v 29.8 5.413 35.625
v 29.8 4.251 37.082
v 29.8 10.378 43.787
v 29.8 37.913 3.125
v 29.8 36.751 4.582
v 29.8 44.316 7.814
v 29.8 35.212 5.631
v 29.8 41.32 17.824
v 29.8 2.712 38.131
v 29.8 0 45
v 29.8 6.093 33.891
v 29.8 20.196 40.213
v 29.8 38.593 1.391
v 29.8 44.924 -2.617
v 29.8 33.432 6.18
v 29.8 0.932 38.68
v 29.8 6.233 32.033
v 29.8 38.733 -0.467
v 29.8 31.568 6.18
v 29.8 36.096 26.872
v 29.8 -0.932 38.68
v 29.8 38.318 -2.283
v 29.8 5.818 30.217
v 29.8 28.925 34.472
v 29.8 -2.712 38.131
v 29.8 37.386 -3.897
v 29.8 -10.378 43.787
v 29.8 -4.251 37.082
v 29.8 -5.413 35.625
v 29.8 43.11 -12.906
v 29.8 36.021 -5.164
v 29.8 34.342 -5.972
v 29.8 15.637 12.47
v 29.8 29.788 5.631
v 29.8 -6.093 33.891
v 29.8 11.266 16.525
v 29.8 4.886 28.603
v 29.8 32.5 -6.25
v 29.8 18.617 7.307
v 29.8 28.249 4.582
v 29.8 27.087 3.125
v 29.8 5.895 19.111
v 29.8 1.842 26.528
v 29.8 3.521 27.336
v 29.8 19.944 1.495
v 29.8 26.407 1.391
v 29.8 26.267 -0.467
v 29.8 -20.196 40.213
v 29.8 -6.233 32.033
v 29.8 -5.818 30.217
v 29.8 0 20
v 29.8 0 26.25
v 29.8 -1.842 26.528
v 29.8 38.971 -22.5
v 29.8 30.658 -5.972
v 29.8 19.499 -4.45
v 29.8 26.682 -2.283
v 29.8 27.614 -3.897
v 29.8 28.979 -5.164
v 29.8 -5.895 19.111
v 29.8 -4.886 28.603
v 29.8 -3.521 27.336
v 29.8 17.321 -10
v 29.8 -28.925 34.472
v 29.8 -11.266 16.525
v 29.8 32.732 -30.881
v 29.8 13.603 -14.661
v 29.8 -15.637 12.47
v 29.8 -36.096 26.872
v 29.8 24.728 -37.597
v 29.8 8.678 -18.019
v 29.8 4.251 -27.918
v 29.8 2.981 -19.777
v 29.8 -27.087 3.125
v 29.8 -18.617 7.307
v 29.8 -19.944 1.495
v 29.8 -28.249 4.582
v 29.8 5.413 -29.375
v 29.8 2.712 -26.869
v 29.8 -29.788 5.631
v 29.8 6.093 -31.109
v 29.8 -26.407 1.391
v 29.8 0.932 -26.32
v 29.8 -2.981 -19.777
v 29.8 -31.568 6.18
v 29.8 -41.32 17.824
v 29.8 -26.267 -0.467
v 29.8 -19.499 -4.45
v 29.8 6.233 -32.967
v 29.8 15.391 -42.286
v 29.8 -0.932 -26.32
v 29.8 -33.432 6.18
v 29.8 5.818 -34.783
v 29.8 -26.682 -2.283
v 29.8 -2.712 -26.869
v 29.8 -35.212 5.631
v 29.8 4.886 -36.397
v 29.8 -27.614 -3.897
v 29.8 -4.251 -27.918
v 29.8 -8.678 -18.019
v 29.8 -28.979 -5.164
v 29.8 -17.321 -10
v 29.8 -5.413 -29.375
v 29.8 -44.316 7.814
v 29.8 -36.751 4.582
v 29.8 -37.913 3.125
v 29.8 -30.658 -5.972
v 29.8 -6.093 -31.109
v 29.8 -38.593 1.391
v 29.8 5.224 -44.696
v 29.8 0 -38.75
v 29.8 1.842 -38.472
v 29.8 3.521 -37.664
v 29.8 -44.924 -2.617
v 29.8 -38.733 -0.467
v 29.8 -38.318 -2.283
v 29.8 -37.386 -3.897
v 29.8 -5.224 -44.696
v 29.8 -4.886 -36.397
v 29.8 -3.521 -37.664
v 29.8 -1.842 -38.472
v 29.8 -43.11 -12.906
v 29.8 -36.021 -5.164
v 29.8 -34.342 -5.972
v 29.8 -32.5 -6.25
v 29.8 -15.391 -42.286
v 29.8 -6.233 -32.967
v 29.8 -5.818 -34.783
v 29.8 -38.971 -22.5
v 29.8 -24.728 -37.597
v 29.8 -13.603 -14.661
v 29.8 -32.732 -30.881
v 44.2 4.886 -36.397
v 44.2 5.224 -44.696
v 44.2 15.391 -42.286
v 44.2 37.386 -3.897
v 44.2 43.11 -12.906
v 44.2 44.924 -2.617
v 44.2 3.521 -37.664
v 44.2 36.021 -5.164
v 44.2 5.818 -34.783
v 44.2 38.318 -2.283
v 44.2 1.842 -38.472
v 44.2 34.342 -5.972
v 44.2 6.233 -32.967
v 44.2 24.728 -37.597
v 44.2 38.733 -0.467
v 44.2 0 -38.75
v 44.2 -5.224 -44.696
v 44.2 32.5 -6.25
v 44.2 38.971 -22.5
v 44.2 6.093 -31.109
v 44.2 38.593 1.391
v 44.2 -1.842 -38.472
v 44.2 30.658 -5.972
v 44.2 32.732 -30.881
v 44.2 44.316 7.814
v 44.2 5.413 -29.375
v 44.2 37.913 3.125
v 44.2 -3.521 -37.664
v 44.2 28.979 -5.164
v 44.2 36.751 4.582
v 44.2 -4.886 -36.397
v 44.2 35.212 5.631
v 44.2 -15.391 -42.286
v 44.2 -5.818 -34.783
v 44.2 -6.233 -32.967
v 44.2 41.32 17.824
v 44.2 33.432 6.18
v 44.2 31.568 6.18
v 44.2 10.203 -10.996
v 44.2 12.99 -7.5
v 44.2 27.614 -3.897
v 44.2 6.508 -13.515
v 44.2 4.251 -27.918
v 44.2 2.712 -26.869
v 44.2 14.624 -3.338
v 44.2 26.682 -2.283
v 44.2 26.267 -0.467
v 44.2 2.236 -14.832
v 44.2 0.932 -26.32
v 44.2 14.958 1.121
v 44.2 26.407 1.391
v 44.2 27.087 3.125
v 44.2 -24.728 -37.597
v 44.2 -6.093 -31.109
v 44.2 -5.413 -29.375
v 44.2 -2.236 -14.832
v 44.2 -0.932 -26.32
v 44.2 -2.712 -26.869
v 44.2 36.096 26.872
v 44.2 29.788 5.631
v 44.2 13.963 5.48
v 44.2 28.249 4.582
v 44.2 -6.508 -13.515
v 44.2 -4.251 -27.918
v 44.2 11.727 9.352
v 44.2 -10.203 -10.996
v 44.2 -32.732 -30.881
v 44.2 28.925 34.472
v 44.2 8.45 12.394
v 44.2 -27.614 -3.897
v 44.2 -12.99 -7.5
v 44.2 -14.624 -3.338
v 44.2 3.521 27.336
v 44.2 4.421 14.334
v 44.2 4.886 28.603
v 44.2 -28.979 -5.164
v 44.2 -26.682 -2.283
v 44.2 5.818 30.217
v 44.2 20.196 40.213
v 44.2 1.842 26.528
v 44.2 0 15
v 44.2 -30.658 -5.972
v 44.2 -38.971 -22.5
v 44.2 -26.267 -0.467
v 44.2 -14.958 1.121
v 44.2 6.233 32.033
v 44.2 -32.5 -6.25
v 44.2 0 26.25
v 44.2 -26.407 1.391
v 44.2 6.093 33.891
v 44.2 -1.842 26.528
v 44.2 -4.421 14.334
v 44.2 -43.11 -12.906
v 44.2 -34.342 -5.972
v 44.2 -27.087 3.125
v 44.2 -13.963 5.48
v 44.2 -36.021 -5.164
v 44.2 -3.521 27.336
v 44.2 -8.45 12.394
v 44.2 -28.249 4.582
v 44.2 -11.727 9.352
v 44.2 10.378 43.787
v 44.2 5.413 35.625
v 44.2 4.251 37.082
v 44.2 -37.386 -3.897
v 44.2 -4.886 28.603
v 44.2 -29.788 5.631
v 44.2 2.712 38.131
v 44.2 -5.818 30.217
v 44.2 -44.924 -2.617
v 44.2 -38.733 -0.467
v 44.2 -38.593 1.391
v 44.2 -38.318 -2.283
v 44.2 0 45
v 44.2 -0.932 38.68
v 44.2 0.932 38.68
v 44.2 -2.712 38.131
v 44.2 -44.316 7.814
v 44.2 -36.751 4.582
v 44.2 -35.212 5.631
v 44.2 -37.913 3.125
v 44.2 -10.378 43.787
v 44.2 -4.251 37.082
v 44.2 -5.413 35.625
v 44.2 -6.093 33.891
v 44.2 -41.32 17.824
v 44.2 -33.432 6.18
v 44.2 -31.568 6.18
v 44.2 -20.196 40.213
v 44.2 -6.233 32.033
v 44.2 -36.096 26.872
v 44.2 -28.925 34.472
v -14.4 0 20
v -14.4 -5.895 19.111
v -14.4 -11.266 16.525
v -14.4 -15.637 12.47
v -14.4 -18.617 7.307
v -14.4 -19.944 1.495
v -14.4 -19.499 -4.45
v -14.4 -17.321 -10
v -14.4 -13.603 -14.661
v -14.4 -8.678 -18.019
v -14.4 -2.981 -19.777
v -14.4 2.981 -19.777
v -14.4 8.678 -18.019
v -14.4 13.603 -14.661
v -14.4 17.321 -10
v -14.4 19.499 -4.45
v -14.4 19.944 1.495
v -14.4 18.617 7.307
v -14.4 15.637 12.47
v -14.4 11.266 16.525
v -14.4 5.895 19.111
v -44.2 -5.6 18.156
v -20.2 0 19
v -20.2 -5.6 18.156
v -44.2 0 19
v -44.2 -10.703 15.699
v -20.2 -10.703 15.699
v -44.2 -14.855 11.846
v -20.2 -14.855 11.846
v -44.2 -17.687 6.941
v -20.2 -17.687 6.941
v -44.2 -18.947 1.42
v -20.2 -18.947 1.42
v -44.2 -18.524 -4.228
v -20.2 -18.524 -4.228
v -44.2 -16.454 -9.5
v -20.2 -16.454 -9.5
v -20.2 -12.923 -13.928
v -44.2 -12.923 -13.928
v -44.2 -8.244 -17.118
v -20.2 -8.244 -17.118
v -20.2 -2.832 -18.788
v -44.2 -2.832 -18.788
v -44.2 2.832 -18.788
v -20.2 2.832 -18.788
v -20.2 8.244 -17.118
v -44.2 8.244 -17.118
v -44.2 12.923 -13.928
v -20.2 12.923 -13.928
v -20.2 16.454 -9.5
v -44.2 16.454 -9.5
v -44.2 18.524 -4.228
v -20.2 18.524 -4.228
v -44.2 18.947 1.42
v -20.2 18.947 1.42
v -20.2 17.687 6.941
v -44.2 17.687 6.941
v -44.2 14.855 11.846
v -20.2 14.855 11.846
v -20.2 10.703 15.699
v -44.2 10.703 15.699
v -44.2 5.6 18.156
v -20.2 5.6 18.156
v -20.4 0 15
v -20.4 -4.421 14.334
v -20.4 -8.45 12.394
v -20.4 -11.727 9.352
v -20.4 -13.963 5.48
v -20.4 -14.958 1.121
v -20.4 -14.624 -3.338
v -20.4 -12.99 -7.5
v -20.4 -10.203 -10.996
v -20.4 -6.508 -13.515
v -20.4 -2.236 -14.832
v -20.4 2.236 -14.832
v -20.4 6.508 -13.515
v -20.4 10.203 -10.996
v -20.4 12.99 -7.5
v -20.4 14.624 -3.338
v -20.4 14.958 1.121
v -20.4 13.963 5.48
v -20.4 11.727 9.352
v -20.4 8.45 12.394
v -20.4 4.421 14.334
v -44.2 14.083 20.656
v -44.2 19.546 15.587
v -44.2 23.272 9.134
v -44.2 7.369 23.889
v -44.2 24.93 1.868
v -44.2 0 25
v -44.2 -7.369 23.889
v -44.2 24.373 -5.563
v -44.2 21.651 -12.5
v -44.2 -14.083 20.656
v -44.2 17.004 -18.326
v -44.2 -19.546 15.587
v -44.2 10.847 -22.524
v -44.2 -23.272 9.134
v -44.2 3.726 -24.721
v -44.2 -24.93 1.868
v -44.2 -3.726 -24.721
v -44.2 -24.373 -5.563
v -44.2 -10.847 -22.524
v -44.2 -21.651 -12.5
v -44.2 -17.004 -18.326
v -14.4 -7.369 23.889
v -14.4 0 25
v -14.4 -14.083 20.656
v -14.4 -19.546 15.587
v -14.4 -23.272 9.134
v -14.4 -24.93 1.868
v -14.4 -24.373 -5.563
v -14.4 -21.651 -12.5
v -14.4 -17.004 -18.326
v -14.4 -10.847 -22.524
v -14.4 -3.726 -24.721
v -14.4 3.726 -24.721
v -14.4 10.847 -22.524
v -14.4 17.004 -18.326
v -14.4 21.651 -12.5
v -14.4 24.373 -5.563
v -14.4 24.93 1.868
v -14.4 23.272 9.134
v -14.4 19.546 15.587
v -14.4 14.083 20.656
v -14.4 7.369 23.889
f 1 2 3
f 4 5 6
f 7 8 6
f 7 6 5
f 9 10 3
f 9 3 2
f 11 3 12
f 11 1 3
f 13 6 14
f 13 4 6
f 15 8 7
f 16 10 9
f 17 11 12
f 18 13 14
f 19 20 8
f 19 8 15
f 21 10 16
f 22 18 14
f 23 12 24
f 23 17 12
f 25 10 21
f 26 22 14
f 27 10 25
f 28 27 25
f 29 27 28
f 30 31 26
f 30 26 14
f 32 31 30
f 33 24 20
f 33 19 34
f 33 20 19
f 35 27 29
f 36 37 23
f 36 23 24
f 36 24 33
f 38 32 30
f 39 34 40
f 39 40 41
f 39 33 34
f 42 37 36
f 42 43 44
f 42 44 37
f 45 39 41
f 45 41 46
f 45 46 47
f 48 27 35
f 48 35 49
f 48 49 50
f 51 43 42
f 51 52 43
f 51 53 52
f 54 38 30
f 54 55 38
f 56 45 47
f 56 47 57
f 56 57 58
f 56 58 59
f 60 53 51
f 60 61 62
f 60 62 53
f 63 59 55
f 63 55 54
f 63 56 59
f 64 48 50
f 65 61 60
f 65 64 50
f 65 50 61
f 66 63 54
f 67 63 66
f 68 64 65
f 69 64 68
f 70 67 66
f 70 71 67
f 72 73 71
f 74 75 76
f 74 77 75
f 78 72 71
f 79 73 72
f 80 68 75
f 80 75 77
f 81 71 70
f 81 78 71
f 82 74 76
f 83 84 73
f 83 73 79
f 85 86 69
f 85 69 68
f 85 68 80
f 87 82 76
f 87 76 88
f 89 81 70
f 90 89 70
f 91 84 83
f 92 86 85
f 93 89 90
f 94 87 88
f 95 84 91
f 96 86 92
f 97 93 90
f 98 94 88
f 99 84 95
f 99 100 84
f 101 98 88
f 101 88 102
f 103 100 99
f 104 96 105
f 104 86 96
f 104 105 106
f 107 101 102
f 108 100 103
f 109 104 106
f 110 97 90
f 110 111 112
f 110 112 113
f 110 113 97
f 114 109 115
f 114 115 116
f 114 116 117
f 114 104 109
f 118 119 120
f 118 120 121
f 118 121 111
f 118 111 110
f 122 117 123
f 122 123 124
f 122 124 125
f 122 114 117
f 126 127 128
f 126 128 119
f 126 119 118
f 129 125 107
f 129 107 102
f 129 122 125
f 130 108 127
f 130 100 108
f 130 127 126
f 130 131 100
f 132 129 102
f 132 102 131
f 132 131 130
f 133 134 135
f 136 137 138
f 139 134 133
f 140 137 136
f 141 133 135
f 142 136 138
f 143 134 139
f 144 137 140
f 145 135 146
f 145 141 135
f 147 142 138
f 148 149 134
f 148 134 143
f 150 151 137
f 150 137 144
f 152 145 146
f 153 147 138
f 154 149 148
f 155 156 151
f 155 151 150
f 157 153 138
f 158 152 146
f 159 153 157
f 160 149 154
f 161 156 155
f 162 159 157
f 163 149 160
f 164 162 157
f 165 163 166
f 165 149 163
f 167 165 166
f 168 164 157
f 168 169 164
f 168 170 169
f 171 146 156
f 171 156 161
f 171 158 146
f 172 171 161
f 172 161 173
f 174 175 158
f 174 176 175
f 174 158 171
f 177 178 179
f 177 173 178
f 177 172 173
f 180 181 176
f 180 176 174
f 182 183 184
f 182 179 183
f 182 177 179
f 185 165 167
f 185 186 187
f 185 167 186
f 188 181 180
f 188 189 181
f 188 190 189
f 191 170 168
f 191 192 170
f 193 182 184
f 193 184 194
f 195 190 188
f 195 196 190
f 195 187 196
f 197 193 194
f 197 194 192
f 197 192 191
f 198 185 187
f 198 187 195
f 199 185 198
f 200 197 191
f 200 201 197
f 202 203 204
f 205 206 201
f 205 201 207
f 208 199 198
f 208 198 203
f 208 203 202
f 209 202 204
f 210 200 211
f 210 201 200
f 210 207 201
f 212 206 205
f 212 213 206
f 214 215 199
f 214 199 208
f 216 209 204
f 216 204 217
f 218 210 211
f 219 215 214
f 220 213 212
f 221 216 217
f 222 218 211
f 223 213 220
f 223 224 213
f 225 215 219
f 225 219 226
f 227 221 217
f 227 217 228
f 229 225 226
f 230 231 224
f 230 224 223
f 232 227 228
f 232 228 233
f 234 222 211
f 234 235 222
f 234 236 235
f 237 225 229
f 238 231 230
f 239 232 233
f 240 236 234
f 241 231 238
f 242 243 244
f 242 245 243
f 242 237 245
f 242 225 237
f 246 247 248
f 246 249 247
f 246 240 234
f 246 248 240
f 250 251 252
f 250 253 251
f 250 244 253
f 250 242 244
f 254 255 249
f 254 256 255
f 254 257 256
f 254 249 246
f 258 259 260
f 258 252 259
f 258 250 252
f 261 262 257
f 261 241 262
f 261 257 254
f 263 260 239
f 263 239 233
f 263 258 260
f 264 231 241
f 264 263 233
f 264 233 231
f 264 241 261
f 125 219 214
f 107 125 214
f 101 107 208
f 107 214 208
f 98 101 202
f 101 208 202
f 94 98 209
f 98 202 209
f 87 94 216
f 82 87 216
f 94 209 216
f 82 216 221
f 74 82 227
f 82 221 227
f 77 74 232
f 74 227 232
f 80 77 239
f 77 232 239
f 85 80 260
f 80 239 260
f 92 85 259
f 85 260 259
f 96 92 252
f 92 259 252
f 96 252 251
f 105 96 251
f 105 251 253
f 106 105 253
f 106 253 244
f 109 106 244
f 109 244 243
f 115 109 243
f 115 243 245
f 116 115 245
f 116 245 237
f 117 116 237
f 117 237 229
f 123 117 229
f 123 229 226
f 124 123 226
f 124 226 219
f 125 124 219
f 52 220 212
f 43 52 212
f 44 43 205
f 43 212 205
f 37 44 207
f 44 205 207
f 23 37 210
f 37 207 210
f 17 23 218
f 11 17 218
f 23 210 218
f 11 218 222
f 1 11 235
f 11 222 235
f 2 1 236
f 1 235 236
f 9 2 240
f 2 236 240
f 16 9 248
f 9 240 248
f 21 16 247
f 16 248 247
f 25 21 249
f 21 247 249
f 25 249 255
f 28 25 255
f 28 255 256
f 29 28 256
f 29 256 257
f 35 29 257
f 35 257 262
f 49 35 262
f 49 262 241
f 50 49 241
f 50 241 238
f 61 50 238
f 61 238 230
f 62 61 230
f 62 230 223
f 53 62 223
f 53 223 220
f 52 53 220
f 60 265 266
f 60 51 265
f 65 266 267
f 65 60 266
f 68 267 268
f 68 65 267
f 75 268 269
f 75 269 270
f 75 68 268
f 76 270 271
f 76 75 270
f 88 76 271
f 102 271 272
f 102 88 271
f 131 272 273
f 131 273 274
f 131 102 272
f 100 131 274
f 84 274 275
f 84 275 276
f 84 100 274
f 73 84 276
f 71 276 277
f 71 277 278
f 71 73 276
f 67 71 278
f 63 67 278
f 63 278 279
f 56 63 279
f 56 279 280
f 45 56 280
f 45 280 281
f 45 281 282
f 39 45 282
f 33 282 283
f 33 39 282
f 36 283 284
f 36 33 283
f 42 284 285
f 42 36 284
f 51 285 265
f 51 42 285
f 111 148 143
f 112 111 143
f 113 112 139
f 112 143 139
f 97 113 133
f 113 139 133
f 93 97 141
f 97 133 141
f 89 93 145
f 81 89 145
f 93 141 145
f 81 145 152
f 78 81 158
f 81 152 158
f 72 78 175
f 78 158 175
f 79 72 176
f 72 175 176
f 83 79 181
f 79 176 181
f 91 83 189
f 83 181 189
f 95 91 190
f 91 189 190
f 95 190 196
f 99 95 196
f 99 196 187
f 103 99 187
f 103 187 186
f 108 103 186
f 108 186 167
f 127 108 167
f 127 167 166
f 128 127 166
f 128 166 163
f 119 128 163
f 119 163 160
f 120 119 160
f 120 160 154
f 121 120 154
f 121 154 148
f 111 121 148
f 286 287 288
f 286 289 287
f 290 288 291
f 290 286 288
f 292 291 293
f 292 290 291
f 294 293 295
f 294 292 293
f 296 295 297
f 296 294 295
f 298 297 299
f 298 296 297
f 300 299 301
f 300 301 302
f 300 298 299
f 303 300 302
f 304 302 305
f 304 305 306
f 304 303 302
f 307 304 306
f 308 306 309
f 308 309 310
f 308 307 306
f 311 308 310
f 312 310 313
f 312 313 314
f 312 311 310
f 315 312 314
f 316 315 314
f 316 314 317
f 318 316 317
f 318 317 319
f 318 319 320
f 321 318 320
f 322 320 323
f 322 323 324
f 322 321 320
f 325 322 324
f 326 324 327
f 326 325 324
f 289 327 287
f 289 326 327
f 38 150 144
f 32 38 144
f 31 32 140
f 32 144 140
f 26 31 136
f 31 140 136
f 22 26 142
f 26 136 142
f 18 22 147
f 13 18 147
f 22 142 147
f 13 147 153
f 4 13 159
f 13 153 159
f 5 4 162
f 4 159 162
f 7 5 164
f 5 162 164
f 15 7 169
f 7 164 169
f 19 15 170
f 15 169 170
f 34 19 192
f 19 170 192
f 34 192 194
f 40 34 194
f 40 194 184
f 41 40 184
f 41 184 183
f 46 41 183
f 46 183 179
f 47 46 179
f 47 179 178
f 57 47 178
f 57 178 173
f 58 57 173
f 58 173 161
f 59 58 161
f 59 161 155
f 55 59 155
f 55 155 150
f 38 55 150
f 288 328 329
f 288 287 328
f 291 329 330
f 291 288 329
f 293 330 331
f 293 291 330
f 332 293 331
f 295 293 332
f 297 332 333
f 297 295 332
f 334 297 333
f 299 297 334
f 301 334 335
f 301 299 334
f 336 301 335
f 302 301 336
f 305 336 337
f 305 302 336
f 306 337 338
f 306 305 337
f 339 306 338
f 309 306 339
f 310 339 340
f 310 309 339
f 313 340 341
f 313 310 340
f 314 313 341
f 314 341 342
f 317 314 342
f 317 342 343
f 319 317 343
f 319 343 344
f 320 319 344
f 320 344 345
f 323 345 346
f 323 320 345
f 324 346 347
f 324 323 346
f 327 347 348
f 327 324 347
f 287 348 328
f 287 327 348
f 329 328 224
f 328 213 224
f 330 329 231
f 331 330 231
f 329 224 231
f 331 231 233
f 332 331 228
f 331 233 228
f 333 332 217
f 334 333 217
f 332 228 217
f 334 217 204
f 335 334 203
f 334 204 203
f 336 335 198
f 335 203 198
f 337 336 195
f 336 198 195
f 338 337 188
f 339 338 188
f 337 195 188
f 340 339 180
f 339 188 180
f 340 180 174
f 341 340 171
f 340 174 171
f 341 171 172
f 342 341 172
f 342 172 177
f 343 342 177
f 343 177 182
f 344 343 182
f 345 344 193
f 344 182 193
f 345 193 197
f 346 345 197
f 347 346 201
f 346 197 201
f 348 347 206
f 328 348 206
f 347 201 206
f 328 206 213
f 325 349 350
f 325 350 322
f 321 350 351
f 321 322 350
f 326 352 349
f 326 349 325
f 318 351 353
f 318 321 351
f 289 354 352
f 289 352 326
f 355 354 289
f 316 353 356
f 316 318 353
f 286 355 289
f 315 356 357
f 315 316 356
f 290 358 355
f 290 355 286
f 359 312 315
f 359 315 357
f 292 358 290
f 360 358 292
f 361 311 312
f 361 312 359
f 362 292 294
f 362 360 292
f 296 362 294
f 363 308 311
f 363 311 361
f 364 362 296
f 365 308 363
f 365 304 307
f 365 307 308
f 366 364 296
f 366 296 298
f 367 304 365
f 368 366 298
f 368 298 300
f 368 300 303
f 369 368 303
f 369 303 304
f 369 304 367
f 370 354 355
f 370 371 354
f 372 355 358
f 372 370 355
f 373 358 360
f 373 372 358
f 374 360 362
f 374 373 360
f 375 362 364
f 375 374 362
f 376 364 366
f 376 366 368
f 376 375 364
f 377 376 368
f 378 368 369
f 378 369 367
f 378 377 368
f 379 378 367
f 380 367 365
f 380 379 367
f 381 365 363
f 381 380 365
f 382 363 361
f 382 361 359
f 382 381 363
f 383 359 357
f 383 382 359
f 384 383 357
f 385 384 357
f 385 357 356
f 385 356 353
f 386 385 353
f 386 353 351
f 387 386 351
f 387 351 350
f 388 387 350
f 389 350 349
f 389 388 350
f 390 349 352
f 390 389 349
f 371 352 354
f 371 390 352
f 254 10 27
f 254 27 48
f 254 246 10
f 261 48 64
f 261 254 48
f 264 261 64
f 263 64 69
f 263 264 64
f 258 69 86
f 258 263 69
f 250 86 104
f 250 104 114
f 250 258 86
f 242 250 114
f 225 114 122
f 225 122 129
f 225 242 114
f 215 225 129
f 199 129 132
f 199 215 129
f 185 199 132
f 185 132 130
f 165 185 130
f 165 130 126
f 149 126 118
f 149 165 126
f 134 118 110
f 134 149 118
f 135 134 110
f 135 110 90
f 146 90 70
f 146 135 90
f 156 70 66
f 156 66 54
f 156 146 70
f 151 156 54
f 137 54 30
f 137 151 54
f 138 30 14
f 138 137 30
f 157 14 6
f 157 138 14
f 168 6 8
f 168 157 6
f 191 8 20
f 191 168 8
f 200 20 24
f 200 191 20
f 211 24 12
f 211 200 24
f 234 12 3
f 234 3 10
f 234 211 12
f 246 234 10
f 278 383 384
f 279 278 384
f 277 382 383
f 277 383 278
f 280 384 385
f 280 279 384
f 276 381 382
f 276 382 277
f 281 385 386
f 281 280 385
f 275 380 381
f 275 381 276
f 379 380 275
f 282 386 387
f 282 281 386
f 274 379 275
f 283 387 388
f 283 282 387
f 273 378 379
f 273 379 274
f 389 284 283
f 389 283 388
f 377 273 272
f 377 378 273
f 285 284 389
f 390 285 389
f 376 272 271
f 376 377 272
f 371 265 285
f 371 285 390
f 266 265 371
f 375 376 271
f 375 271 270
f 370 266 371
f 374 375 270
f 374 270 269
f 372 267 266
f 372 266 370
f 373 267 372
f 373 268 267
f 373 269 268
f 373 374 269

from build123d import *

# Parameters (mm, degrees)
SKETCH2_R          = 6.25
CUT_EXTRUDE1_DEPTH = 109.92456105


with BuildPart() as part:
    # Sketch1 → Revolve1 (revolve)
    with BuildSketch(Plane(origin=(0, 0, 0), x_dir=(1, 0, 0), z_dir=(0, 1, 0)), mode=Mode.PRIVATE) as revolve1_sk:
        Polygon((-44.2, 25), (-14.4, 25), (-14.4, 20), (29.8, 20), (29.8, 45), (44.2, 45), (44.2, 15), (20.4, 15), (-20.4, 15), (-20.2, 19), (-44.2, 19), align=None)
    revolve(revolve1_sk.sketch.rotate(Axis((-44.2, 0, 0), (1, 0, 0)), 180), axis=Axis((-44.2, 0, 0), (1, 0, 0)))

    # Sketch2 → Cut-Extrude1 (cut, through all)
    with BuildSketch(Plane(origin=(44.2, 0, 0), x_dir=(0, 0, -1), z_dir=(1, 0, 0))):
        with Locations((0, 32.5)):
            Circle(SKETCH2_R)
        with Locations((32.5, 0)):
            Circle(SKETCH2_R)
        with Locations((0, -32.5)):
            Circle(SKETCH2_R)
        with Locations((-32.5, 0)):
            Circle(SKETCH2_R)
    extrude(amount=-CUT_EXTRUDE1_DEPTH, mode=Mode.SUBTRACT)


solid = part.part
